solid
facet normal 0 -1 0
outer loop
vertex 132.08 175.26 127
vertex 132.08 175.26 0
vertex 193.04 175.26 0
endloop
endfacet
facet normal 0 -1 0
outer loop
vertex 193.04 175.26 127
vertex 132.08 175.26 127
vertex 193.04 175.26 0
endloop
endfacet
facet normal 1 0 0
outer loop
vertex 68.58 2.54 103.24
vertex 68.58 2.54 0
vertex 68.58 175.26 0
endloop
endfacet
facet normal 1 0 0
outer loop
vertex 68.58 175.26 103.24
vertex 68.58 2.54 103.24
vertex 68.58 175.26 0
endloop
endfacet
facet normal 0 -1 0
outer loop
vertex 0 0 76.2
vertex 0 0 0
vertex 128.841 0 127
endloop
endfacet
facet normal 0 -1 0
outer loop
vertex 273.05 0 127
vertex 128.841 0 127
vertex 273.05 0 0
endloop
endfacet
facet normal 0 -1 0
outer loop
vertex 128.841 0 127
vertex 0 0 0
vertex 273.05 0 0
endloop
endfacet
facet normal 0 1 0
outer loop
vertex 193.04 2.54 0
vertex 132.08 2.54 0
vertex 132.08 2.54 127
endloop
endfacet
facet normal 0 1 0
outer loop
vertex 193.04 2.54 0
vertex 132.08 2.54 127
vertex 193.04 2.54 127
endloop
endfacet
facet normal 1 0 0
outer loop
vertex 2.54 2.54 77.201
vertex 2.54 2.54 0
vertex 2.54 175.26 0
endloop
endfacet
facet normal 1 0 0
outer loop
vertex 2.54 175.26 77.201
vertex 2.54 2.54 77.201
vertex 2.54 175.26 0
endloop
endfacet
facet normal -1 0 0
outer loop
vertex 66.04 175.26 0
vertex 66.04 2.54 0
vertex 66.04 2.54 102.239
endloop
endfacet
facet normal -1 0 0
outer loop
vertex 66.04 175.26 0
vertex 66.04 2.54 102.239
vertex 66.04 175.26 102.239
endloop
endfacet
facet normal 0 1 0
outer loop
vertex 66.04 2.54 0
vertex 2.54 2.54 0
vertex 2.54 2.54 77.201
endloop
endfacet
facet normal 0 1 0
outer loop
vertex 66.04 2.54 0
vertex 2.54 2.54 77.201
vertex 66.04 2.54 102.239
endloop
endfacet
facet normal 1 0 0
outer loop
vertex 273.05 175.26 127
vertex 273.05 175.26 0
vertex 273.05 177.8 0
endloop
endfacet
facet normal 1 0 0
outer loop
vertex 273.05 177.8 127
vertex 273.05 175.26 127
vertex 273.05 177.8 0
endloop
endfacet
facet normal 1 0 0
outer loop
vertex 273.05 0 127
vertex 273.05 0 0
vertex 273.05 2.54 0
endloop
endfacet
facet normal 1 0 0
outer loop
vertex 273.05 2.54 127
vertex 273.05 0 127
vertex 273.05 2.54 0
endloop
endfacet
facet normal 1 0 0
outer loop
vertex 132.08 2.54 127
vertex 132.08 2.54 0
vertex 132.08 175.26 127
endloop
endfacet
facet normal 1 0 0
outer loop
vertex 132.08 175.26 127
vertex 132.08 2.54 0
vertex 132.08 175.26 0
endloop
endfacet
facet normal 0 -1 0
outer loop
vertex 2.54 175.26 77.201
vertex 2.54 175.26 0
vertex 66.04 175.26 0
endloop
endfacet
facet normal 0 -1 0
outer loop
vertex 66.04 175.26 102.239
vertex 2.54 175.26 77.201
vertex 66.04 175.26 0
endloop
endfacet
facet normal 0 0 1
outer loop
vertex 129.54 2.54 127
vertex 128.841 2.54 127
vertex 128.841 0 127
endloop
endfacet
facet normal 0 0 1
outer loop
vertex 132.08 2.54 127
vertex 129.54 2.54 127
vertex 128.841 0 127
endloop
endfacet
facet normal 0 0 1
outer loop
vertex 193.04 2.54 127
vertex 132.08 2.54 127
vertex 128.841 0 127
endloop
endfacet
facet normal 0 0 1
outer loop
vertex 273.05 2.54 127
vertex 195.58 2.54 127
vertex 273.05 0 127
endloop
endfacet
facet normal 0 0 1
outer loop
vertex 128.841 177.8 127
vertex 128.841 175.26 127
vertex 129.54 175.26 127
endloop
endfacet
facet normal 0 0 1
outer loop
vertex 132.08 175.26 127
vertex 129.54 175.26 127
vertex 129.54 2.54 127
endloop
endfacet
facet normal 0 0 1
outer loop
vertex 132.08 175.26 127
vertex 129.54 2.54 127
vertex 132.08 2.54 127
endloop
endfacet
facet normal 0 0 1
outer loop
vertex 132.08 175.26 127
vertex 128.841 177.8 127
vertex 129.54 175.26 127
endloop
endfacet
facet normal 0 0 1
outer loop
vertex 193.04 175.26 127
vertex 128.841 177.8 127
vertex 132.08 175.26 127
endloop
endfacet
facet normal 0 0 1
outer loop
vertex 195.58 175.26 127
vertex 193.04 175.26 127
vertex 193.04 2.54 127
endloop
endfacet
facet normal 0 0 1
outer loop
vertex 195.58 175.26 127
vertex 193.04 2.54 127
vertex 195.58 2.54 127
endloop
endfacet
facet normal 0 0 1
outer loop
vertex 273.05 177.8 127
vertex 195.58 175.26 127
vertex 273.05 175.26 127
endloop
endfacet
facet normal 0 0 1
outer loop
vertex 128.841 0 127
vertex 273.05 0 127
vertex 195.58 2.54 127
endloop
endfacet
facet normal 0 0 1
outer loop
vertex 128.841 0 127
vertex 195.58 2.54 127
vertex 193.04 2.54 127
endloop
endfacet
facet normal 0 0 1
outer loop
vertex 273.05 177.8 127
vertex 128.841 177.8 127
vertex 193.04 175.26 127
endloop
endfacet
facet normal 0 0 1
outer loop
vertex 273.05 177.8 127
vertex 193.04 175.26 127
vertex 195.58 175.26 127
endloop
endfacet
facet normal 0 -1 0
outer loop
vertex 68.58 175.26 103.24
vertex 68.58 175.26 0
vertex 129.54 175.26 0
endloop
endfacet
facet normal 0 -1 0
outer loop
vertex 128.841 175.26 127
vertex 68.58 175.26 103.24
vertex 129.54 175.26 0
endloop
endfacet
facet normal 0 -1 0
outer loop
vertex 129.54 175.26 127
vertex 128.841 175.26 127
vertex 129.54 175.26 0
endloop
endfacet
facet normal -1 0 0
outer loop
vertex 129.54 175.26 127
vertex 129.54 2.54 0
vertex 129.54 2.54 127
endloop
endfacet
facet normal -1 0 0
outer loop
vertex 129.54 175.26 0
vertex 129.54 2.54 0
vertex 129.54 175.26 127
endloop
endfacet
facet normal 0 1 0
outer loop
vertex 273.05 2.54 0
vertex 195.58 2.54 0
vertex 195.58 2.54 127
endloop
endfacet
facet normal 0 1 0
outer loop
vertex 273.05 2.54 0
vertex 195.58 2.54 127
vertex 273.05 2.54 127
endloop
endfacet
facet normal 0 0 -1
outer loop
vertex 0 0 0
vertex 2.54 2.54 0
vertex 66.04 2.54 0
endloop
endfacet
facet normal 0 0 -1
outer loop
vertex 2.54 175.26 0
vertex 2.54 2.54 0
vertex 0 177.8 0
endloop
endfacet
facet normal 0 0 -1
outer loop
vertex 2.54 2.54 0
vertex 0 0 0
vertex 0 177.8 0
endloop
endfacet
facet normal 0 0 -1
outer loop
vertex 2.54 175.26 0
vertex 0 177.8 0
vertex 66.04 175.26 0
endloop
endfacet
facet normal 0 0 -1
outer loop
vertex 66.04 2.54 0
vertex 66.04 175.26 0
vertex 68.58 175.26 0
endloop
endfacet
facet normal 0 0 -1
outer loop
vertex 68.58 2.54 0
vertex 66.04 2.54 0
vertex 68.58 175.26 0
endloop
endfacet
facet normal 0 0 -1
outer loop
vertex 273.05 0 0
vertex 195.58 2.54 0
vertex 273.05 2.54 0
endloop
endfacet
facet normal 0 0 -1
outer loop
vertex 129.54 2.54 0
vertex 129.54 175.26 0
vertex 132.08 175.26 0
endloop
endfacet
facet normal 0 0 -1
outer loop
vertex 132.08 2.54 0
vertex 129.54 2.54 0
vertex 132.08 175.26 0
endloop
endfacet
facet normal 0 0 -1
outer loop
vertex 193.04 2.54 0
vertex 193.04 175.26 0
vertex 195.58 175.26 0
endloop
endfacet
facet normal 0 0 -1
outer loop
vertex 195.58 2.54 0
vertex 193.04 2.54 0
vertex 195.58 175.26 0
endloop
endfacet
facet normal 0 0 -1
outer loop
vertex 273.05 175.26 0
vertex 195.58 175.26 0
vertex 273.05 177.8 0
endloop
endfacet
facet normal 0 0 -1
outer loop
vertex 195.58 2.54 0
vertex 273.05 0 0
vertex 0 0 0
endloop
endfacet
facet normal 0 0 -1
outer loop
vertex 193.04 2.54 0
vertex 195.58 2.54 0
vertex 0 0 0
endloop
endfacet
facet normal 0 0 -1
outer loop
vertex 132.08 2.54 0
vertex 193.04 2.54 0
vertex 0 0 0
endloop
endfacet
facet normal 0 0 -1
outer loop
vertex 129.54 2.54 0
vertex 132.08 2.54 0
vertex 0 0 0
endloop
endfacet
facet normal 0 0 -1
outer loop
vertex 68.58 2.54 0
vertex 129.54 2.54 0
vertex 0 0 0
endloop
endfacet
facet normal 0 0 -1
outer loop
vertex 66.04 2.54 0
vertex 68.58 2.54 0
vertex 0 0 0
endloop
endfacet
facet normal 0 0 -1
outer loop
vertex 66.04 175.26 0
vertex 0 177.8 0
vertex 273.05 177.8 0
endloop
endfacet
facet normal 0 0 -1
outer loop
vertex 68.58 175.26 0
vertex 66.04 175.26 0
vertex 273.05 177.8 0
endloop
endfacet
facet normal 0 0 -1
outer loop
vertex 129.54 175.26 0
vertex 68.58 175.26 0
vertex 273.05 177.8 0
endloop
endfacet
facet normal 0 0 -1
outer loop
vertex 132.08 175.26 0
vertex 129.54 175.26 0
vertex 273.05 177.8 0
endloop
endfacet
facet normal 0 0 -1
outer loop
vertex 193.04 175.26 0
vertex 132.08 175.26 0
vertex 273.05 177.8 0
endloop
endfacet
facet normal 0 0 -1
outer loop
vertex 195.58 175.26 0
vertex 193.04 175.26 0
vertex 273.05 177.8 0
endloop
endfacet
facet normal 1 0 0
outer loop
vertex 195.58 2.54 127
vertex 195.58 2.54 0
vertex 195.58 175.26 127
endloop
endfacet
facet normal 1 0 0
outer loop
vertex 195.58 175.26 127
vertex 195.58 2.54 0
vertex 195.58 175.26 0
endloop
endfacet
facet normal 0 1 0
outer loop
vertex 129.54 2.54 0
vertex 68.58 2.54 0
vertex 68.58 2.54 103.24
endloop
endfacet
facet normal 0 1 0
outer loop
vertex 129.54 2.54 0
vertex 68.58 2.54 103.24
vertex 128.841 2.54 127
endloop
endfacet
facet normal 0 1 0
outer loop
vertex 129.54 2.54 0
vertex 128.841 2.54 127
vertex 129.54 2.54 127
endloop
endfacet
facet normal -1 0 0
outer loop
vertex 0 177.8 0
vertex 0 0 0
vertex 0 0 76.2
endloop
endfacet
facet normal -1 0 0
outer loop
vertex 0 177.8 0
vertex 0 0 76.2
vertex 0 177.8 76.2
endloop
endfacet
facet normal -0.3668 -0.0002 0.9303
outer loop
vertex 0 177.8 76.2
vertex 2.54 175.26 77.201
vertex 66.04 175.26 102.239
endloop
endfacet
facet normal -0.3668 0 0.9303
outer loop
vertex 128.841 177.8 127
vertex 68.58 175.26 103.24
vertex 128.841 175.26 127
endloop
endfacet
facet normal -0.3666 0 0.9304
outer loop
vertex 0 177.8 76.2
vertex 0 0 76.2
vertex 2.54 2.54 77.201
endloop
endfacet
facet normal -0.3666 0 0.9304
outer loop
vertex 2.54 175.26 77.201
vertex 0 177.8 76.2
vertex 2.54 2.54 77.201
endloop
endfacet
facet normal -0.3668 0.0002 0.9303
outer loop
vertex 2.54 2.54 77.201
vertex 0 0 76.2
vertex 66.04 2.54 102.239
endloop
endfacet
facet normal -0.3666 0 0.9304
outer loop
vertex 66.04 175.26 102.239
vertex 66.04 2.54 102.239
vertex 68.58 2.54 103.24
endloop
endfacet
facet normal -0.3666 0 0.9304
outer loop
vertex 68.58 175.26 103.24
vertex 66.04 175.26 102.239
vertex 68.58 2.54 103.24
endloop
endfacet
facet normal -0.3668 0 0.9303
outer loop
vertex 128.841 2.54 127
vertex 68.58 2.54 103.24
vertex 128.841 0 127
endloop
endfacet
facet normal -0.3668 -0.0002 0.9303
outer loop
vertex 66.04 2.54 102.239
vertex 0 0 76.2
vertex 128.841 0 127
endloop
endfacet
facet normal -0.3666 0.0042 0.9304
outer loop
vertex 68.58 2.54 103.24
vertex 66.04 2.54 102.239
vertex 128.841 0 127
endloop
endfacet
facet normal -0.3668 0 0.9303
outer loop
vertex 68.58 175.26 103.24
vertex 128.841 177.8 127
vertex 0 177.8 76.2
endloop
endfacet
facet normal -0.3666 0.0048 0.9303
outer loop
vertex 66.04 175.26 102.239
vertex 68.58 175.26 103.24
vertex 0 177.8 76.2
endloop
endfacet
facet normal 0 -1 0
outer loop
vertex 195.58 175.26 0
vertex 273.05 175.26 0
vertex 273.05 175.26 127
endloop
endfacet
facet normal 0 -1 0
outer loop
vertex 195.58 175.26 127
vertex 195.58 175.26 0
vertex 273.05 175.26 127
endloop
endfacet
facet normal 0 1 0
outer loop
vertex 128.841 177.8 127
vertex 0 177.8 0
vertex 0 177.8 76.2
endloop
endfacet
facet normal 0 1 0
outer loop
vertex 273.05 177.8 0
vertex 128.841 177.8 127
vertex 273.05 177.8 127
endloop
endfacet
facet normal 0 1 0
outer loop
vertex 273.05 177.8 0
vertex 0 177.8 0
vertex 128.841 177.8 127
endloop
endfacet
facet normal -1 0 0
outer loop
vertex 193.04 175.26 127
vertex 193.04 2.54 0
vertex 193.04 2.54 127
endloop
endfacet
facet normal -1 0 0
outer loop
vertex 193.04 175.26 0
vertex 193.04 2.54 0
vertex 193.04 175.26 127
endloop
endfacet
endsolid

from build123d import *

# Parameters (mm, degrees)
F0_W     = 273.05
F0_H     = 177.8
F0_W_2   = 267.97
F0_H_2   = 172.72
F1_DEPTH = 127
F2_W     = 2.54
F2_H     = 172.72
F3_DEPTH = 127
F5_DEPTH = 177.801
F6_W     = 172.72
F6_H     = 127
F7_DEPTH = 25.4


with BuildPart() as f1:
    # F0 (on Top) → F1 (new body)
    with BuildSketch(Plane.XY):
        with Locations((136.525, 88.9)):
            Rectangle(F0_W, F0_H)
        with Locations((136.525, 88.9)):
            Rectangle(F0_W_2, F0_H_2, mode=Mode.SUBTRACT)
    extrude(amount=F1_DEPTH)

    # F2 (on Top) → F3 (join)
    with BuildSketch(Plane.XY):
        with Locations((67.31, 88.9)):
            Rectangle(F2_W, F2_H)
        with Locations((130.81, 88.9)):
            Rectangle(F2_W, F2_H)
        with Locations((194.31, 88.9)):
            Rectangle(F2_W, F2_H)
    extrude(amount=F3_DEPTH)

    # F4 (on face) → F5 (cut, through all)
    with BuildSketch(Plane.XZ):
        Polygon((0, 76.2), (128.840938, 127), (0, 127), align=None)
    extrude(amount=-F5_DEPTH, mode=Mode.SUBTRACT)

    # F6 (on face) → F7 (cut)
    with BuildSketch(Plane.YZ.offset(273.05)):
        with Locations((88.9, 63.5)):
            Rectangle(F6_W, F6_H)
    extrude(amount=-F7_DEPTH, mode=Mode.SUBTRACT)


solid = f1.part
